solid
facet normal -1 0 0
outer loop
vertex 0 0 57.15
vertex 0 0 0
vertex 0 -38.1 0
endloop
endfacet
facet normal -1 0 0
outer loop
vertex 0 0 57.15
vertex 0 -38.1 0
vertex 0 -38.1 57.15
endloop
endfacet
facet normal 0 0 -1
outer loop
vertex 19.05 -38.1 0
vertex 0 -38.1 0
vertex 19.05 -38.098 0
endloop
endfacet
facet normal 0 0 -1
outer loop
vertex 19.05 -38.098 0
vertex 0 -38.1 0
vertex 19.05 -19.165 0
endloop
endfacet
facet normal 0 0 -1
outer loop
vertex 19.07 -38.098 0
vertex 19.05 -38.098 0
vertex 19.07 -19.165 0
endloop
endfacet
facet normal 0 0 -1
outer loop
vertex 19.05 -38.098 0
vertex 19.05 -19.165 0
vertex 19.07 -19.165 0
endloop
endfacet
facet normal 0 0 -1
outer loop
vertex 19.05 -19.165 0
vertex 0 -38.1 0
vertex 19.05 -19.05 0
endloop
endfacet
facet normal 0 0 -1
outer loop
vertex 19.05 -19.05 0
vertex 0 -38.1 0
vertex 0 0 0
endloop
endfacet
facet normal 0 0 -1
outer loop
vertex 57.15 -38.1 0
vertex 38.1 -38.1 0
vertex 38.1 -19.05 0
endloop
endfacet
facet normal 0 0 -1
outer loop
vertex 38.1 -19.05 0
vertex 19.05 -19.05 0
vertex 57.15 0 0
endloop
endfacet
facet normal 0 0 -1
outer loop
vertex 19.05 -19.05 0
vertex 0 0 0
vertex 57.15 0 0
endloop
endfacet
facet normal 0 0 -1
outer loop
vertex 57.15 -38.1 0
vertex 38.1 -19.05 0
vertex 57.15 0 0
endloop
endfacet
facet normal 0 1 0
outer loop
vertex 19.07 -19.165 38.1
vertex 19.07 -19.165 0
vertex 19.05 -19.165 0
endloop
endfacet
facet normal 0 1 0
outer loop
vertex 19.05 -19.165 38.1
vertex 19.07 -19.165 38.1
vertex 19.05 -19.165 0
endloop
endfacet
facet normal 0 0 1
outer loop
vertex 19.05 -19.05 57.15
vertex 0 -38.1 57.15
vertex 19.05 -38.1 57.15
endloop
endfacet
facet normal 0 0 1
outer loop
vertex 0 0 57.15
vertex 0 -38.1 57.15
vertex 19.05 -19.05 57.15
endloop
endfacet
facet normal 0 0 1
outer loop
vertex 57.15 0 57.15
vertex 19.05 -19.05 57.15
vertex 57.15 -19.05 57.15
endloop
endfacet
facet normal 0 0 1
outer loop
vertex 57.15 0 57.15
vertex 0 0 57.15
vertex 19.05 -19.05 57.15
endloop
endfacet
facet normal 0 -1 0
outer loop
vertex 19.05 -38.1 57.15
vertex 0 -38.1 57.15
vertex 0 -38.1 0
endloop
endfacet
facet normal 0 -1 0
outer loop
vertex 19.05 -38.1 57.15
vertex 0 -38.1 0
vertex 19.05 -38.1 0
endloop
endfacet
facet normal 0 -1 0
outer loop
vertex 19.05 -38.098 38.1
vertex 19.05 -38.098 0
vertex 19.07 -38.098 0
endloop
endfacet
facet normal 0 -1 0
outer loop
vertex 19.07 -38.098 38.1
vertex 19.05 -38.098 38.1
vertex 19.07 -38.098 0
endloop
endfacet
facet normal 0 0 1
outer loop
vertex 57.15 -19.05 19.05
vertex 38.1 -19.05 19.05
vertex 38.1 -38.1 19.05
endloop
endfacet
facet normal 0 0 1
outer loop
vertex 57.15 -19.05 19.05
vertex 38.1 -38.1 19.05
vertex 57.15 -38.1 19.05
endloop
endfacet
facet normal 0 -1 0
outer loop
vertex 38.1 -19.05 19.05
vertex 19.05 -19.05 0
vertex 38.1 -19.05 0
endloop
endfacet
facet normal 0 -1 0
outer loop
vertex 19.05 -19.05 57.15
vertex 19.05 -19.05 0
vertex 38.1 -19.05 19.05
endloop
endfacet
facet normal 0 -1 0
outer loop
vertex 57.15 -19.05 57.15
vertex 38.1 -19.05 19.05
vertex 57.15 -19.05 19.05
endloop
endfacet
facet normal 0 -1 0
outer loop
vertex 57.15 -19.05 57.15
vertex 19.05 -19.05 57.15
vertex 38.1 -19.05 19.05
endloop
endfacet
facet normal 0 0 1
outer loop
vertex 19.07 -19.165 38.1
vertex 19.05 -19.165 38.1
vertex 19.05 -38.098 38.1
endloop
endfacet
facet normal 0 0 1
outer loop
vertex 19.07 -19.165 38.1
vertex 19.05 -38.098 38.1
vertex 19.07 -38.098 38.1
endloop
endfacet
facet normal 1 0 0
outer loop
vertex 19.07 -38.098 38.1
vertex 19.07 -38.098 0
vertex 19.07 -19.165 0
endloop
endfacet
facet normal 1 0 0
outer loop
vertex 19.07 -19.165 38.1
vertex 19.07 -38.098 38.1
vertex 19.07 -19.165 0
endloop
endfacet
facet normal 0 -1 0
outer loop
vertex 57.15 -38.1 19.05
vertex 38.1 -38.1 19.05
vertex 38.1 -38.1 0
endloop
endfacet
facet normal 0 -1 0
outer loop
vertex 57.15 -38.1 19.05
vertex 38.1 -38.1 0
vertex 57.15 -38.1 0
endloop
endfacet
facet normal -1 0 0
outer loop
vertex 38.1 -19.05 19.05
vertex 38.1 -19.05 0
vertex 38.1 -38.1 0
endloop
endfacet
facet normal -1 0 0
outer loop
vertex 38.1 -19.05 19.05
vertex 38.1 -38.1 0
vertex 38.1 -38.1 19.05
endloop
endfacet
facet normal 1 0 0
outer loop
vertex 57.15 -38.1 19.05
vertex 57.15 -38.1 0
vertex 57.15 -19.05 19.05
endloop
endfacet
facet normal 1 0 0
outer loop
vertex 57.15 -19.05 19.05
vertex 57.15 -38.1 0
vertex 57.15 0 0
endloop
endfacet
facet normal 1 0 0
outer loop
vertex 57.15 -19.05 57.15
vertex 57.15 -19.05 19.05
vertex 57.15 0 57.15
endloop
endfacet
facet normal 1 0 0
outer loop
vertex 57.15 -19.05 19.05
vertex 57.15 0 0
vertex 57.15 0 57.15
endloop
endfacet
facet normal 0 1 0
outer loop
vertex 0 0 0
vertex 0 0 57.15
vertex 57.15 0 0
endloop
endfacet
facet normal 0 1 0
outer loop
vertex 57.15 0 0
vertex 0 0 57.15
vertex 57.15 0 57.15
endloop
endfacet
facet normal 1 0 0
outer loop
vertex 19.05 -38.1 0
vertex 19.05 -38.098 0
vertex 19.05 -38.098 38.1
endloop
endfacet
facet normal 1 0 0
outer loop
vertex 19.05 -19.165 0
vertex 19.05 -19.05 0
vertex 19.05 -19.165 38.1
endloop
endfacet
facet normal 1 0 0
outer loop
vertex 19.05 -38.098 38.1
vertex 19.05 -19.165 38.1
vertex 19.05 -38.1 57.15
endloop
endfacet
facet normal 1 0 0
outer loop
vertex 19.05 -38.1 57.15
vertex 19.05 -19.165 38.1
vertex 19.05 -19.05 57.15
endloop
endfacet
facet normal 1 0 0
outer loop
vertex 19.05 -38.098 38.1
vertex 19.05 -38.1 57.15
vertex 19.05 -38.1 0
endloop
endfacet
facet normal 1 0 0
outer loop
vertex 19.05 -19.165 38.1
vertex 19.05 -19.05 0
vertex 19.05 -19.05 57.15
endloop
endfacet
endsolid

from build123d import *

# Parameters (mm, degrees)
F0_W     = 57.15
F0_H     = 19.05
F1_DEPTH = 19.05
F2_W     = 19.05
F2_H     = 19.05
F3_DEPTH = 19.05
F4_W     = 19.05
F4_H     = 19.05
F5_DEPTH = 19.05
F7_DEPTH = 38.1


with BuildPart() as f1:
    # F0 (on Front) → F1 (new body)
    with BuildSketch(Plane.XZ):
        with Locations((28.575, 9.525)):
            Rectangle(F0_W, F0_H)
    extrude(amount=F1_DEPTH)

    # F4 (on face) → F5 (join)
    with BuildSketch(Plane.XZ.offset(19.05)):
        with Locations((9.525, 9.525)):
            Rectangle(F4_W, F4_H)
    extrude(amount=F5_DEPTH)



with BuildPart() as f3:
    # F2 (on face) → F3 (new body)
    with BuildSketch(Plane.XZ.offset(19.05)):
        with Locations((47.625, 9.525)):
            Rectangle(F2_W, F2_H)
    extrude(amount=F3_DEPTH)


with BuildPart() as f1_1:
    add(f1.part)

    add(f3.part)  # F7 merges F3
    # F6 (on Top) + F5_face (on face) → F7 (join)
    with BuildSketch(Plane.XY):
        Polygon((0, -19.164518), (0, -38.021836), (19.069996, -38.098183), (19.069996, -19.164518), align=None)
    with BuildSketch(Plane(origin=(23.8125, -14.2875, 19.05), x_dir=(1, 0, 0), z_dir=(0, 0, 1))):
        Polygon((33.3375, -4.7625), (33.3375, 14.2875), (-23.8125, 14.2875), (-23.8125, -23.8125), (-4.7625, -23.8125), (-4.7625, -4.7625), align=None)
    extrude(amount=F7_DEPTH)


solid = f1_1.part
